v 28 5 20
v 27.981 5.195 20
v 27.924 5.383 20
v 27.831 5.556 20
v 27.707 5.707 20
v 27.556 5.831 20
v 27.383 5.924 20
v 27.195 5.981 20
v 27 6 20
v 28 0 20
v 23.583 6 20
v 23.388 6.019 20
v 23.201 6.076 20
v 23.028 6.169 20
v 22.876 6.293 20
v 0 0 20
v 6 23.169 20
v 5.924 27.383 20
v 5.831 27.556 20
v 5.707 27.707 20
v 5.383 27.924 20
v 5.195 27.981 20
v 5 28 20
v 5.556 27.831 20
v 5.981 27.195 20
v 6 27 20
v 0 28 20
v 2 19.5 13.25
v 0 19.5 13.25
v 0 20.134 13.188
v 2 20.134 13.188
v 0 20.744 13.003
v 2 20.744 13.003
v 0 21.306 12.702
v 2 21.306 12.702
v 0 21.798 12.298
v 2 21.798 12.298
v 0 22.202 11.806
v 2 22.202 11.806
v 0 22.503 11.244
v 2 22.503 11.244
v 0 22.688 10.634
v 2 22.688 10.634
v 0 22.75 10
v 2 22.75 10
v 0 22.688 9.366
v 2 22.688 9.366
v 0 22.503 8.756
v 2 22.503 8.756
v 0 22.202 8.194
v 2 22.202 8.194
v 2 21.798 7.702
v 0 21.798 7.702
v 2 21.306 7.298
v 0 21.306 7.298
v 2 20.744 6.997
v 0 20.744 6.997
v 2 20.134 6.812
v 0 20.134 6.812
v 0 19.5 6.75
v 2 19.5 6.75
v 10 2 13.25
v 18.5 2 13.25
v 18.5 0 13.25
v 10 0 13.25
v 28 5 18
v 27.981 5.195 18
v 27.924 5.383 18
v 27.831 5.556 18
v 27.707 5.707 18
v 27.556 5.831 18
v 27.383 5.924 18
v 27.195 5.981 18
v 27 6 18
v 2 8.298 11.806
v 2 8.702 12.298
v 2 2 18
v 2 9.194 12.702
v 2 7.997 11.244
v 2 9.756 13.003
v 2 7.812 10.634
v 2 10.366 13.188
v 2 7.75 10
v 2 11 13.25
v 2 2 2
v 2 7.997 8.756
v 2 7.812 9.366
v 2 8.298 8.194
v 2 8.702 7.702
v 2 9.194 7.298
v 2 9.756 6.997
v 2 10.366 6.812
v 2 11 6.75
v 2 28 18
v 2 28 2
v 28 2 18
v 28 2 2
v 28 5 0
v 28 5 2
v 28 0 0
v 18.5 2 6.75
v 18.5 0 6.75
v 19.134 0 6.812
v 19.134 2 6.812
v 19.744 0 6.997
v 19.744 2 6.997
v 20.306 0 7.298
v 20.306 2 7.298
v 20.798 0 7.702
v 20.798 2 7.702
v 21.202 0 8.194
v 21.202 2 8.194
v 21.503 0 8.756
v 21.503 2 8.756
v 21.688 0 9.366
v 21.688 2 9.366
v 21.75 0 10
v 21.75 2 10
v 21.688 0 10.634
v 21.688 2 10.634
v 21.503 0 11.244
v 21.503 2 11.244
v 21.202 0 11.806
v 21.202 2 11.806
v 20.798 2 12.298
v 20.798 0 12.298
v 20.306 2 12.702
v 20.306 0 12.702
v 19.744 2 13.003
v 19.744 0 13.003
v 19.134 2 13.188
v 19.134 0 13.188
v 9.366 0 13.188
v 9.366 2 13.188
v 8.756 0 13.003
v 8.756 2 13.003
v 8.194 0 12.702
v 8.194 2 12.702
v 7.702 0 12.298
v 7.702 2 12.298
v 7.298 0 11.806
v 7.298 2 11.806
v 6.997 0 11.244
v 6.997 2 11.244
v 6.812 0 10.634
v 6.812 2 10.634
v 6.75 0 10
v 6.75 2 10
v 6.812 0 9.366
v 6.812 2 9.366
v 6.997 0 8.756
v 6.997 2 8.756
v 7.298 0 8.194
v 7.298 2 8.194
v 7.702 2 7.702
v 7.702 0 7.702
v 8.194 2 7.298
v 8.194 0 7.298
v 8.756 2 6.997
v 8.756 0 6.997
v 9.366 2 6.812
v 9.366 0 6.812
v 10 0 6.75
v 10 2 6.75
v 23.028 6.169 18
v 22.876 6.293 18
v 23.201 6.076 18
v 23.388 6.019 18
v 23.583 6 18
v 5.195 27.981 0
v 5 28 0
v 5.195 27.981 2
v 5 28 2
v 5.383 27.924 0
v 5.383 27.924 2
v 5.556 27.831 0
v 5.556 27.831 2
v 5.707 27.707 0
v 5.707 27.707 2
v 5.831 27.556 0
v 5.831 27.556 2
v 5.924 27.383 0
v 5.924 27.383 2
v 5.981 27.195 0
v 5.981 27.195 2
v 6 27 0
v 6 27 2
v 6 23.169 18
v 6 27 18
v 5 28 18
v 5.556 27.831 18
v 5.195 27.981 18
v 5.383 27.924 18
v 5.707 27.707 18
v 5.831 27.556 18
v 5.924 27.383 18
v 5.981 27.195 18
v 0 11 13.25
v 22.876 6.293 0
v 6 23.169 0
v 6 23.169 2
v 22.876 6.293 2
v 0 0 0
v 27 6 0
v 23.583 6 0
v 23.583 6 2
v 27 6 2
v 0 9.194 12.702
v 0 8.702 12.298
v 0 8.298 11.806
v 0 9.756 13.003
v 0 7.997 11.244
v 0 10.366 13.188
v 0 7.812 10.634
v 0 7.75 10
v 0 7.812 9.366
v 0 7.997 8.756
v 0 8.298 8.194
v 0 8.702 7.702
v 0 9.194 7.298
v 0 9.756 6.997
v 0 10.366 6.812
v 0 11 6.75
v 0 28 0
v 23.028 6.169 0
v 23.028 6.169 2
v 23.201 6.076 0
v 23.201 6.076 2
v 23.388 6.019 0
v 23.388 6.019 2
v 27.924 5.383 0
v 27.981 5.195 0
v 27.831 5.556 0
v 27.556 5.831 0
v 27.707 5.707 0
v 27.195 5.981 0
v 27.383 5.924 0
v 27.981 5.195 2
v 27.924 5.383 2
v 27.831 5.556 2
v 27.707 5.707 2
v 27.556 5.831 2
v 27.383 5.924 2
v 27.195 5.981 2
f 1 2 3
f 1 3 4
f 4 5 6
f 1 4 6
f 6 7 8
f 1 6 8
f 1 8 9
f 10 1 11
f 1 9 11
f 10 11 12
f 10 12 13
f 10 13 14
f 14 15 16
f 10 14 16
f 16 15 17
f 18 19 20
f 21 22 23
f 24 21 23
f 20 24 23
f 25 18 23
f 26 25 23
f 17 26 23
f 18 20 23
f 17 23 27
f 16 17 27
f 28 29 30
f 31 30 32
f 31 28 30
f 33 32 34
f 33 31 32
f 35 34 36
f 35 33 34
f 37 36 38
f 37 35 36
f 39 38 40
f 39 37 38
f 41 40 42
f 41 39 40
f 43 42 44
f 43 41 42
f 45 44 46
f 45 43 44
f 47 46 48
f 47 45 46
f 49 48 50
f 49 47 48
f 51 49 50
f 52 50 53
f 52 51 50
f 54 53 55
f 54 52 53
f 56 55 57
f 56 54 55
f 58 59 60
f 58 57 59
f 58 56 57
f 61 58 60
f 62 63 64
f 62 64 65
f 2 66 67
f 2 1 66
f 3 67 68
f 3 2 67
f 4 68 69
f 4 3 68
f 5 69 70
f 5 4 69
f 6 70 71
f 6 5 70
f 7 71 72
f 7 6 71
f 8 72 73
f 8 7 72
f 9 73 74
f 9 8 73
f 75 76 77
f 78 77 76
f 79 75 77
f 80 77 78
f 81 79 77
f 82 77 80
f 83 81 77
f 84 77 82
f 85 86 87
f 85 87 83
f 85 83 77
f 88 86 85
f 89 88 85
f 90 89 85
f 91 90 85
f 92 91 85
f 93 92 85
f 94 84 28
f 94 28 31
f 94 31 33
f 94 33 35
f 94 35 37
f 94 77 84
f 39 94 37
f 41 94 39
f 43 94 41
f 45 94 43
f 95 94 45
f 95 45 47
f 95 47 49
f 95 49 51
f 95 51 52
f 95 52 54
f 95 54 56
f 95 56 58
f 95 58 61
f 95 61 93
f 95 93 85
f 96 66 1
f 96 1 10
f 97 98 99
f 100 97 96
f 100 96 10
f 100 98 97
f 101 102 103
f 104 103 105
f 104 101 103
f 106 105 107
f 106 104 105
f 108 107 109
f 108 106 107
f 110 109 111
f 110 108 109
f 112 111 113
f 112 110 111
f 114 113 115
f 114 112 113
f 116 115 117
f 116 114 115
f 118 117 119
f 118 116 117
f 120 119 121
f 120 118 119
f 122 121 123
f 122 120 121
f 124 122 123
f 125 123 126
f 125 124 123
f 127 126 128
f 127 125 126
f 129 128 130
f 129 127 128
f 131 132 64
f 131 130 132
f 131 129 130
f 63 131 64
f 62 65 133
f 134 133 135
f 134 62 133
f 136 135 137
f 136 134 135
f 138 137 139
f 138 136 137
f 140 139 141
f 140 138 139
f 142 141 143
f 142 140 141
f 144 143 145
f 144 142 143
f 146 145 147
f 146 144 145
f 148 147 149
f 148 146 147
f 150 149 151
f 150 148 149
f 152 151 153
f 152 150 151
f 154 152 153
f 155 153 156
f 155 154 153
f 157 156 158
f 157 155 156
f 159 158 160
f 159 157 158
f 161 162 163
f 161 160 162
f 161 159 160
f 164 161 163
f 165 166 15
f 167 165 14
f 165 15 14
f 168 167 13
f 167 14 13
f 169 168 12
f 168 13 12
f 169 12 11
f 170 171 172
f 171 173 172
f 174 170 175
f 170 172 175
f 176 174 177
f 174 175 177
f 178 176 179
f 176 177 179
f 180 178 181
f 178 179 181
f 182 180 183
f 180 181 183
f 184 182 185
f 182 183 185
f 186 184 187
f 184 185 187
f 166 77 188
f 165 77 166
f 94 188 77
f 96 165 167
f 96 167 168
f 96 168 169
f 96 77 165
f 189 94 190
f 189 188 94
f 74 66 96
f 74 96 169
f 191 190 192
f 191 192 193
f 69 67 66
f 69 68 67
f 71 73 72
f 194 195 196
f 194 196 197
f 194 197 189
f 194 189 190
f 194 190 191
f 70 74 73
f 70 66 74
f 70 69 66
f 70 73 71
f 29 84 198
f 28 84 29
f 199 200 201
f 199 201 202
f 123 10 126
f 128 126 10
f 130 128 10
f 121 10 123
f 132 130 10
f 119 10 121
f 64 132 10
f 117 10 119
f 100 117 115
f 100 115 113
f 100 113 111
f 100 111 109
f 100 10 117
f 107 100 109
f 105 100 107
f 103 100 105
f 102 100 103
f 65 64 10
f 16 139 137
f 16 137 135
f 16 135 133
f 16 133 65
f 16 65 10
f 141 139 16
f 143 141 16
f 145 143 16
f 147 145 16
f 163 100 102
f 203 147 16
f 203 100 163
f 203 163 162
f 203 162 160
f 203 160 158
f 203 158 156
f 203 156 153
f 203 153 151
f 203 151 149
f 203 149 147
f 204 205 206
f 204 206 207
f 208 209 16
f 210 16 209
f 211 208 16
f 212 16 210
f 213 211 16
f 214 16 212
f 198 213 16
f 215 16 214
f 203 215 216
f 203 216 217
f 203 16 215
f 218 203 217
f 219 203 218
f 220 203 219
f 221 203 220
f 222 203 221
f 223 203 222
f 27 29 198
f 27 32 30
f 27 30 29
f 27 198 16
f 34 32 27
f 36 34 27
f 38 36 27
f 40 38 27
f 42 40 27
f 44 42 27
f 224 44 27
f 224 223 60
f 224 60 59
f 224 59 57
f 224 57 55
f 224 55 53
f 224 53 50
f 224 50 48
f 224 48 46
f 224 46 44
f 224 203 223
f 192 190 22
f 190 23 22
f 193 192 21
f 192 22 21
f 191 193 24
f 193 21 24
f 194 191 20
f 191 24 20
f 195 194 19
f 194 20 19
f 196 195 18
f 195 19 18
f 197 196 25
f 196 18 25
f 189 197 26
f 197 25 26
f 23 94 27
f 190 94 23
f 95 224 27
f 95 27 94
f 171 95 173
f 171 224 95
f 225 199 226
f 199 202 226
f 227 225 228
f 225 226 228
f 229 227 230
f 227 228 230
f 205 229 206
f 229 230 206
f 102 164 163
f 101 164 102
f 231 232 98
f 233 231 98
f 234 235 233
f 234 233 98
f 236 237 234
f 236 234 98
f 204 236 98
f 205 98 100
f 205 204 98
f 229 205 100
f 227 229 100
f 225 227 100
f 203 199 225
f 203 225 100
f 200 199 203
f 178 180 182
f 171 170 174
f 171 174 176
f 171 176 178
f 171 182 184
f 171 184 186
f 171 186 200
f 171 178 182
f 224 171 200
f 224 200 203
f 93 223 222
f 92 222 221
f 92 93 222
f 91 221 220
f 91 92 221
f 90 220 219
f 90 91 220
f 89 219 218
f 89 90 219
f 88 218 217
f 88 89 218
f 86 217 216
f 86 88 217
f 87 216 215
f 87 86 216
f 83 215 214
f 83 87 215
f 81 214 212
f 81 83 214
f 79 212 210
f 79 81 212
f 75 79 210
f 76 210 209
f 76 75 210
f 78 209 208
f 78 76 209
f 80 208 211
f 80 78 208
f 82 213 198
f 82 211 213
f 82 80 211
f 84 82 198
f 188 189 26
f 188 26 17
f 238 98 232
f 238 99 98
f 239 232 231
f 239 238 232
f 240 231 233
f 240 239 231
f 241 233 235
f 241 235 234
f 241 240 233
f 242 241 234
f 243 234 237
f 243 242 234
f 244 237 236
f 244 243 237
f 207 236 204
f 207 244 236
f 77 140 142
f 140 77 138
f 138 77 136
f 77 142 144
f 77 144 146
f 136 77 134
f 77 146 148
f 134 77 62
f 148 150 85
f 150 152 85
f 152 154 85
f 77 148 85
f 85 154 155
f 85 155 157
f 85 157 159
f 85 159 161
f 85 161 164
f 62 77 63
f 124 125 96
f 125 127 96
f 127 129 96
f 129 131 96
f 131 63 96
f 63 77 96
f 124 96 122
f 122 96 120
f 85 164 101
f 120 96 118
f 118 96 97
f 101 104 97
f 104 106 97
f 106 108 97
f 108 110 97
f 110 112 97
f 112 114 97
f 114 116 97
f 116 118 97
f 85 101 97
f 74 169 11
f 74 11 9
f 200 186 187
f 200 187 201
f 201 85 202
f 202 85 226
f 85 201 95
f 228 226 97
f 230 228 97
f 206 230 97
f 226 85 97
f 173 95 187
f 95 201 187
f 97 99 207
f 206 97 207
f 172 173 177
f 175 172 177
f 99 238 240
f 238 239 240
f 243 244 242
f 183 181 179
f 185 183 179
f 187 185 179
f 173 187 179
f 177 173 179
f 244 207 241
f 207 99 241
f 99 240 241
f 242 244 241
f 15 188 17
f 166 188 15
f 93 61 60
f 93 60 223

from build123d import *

# Parameters (mm, degrees)
EXTRUDE_1_DEPTH     = 20
SKETCH_2_W          = 16
SKETCH_2_H          = 26
CUT_EXTRUDE_1_DEPTH = 26
CUT_EXTRUDE_2_REACH = 4
CUT_EXTRUDE_3_REACH = 4
FILLET_1_R          = 1


with BuildPart() as part:
    # 草图1 → 凸台-拉伸1 (new body)
    with BuildSketch(Plane.XY):
        Polygon((0, 0), (0, 28), (6, 28), (6, 23.169014085), (23.169014085, 6), (28, 6), (28, 0), align=None)
    extrude(amount=EXTRUDE_1_DEPTH)

    # 草图2 → 切除-拉伸1 (cut)
    with BuildSketch(Plane(origin=(28, 0, 0), x_dir=(0, 0, -1), z_dir=(1, 0, 0))):
        with Locations((-10, 15)):
            Rectangle(SKETCH_2_W, SKETCH_2_H)
    extrude(amount=-CUT_EXTRUDE_1_DEPTH, mode=Mode.SUBTRACT)

    # 草图3 → 切除-拉伸2 (cut, up to next)
    with BuildSketch(Plane(origin=(2, 0, 0), x_dir=(0, 0, -1), z_dir=(1, 0, 0)), mode=Mode.PRIVATE) as cut_extrude_2_sk1:
        with BuildLine():
            Line((-13.25, 11), (-13.25, 19.5))
            ThreePointArc((-13.25, 19.5), (-10, 22.75), (-6.75, 19.5))
            Line((-6.75, 19.5), (-6.75, 11))
            ThreePointArc((-6.75, 11), (-10, 7.75), (-13.25, 11))
        make_face()
    cut_extrude_2_tool1 = extrude(cut_extrude_2_sk1.sketch, amount=-CUT_EXTRUDE_2_REACH, mode=Mode.PRIVATE) & part.part
    add(cut_extrude_2_tool1.solids().sort_by_distance((2, 15.25, 10))[0], mode=Mode.SUBTRACT)

    # 草图4 → 切除-拉伸3 (cut, up to next)
    with BuildSketch(Plane(origin=(0, 2, 2), x_dir=(1, 0, 0), z_dir=(0, 1, 0)), mode=Mode.PRIVATE) as cut_extrude_3_sk1:
        with BuildLine():
            Line((10, -4.75), (18.5, -4.75))
            ThreePointArc((18.5, -4.75), (21.75, -8), (18.5, -11.25))
            Line((18.5, -11.25), (10, -11.25))
            ThreePointArc((10, -11.25), (6.75, -8), (10, -4.75))
        make_face()
    cut_extrude_3_tool1 = extrude(cut_extrude_3_sk1.sketch, amount=-CUT_EXTRUDE_3_REACH, mode=Mode.PRIVATE) & part.part
    add(cut_extrude_3_tool1.solids().sort_by_distance((14.25, 2, 10))[0], mode=Mode.SUBTRACT)

    # 圆角1
    fillet_1_edges = [part.edges().sort_by_distance(p)[0] for p in [
        (6, 28, 19),
        (23.169014085, 6, 19),
        (28, 6, 19),
        (6, 28, 1),
        (23.169014085, 6, 1),
        (28, 6, 1),
    ]]
    fillet(fillet_1_edges, radius=FILLET_1_R)


solid = part.part
